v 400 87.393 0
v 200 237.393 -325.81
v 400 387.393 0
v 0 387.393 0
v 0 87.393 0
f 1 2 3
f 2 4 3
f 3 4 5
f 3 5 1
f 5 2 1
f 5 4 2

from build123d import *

# Parameters (mm, degrees)
ESQUISSE4_W             = 400
ESQUISSE4_H             = 300
BOSS_EXTRU_1_DEPTH      = 325.81
ENL_V_MAT_EXTRU_1_DEPTH = 597.784849087
ENL_V_MAT_EXTRU_3_DEPTH = 758.184749953


with BuildPart() as part:
    # Esquisse4 → Boss.-Extru.1 (new body)
    with BuildSketch(Plane.XY):
        with Locations((200, 237.392658036)):
            Rectangle(ESQUISSE4_W, ESQUISSE4_H)
    extrude(amount=-BOSS_EXTRU_1_DEPTH)

    # Esquisse9 → Enlèv. mat.-Extru.1 (cut, through all)
    with BuildSketch(Plane(origin=(0, 387.392658036, 0), x_dir=(1, 0, 0), z_dir=(0, 1, 0))):
        Polygon((0, 0), (200, 325.81), (400, 0), (400, 335.81), (0, 335.81), align=None)
    extrude(amount=-ENL_V_MAT_EXTRU_1_DEPTH, mode=Mode.SUBTRACT)

    # Esquisse10 → Enlèv. mat.-Extru.3 (cut, through all, along a direction that is not the sketch's normal)
    with BuildSketch(Plane(origin=(0, 0, 0), x_dir=(-0.5231513885267656, 0, 0.8522397694795271), z_dir=(-0.8522397694795271, 0, -0.5231513885267656))):
        Polygon((0, 387.392658036), (-382.298516999, 237.392658036), (0, 87.392658036), (-392.298516999, 87.392658036), (-392.298516999, 387.392658036), align=None)
    extrude(amount=-ENL_V_MAT_EXTRU_3_DEPTH, dir=(-1, 0, 0), mode=Mode.SUBTRACT)


solid = part.part
